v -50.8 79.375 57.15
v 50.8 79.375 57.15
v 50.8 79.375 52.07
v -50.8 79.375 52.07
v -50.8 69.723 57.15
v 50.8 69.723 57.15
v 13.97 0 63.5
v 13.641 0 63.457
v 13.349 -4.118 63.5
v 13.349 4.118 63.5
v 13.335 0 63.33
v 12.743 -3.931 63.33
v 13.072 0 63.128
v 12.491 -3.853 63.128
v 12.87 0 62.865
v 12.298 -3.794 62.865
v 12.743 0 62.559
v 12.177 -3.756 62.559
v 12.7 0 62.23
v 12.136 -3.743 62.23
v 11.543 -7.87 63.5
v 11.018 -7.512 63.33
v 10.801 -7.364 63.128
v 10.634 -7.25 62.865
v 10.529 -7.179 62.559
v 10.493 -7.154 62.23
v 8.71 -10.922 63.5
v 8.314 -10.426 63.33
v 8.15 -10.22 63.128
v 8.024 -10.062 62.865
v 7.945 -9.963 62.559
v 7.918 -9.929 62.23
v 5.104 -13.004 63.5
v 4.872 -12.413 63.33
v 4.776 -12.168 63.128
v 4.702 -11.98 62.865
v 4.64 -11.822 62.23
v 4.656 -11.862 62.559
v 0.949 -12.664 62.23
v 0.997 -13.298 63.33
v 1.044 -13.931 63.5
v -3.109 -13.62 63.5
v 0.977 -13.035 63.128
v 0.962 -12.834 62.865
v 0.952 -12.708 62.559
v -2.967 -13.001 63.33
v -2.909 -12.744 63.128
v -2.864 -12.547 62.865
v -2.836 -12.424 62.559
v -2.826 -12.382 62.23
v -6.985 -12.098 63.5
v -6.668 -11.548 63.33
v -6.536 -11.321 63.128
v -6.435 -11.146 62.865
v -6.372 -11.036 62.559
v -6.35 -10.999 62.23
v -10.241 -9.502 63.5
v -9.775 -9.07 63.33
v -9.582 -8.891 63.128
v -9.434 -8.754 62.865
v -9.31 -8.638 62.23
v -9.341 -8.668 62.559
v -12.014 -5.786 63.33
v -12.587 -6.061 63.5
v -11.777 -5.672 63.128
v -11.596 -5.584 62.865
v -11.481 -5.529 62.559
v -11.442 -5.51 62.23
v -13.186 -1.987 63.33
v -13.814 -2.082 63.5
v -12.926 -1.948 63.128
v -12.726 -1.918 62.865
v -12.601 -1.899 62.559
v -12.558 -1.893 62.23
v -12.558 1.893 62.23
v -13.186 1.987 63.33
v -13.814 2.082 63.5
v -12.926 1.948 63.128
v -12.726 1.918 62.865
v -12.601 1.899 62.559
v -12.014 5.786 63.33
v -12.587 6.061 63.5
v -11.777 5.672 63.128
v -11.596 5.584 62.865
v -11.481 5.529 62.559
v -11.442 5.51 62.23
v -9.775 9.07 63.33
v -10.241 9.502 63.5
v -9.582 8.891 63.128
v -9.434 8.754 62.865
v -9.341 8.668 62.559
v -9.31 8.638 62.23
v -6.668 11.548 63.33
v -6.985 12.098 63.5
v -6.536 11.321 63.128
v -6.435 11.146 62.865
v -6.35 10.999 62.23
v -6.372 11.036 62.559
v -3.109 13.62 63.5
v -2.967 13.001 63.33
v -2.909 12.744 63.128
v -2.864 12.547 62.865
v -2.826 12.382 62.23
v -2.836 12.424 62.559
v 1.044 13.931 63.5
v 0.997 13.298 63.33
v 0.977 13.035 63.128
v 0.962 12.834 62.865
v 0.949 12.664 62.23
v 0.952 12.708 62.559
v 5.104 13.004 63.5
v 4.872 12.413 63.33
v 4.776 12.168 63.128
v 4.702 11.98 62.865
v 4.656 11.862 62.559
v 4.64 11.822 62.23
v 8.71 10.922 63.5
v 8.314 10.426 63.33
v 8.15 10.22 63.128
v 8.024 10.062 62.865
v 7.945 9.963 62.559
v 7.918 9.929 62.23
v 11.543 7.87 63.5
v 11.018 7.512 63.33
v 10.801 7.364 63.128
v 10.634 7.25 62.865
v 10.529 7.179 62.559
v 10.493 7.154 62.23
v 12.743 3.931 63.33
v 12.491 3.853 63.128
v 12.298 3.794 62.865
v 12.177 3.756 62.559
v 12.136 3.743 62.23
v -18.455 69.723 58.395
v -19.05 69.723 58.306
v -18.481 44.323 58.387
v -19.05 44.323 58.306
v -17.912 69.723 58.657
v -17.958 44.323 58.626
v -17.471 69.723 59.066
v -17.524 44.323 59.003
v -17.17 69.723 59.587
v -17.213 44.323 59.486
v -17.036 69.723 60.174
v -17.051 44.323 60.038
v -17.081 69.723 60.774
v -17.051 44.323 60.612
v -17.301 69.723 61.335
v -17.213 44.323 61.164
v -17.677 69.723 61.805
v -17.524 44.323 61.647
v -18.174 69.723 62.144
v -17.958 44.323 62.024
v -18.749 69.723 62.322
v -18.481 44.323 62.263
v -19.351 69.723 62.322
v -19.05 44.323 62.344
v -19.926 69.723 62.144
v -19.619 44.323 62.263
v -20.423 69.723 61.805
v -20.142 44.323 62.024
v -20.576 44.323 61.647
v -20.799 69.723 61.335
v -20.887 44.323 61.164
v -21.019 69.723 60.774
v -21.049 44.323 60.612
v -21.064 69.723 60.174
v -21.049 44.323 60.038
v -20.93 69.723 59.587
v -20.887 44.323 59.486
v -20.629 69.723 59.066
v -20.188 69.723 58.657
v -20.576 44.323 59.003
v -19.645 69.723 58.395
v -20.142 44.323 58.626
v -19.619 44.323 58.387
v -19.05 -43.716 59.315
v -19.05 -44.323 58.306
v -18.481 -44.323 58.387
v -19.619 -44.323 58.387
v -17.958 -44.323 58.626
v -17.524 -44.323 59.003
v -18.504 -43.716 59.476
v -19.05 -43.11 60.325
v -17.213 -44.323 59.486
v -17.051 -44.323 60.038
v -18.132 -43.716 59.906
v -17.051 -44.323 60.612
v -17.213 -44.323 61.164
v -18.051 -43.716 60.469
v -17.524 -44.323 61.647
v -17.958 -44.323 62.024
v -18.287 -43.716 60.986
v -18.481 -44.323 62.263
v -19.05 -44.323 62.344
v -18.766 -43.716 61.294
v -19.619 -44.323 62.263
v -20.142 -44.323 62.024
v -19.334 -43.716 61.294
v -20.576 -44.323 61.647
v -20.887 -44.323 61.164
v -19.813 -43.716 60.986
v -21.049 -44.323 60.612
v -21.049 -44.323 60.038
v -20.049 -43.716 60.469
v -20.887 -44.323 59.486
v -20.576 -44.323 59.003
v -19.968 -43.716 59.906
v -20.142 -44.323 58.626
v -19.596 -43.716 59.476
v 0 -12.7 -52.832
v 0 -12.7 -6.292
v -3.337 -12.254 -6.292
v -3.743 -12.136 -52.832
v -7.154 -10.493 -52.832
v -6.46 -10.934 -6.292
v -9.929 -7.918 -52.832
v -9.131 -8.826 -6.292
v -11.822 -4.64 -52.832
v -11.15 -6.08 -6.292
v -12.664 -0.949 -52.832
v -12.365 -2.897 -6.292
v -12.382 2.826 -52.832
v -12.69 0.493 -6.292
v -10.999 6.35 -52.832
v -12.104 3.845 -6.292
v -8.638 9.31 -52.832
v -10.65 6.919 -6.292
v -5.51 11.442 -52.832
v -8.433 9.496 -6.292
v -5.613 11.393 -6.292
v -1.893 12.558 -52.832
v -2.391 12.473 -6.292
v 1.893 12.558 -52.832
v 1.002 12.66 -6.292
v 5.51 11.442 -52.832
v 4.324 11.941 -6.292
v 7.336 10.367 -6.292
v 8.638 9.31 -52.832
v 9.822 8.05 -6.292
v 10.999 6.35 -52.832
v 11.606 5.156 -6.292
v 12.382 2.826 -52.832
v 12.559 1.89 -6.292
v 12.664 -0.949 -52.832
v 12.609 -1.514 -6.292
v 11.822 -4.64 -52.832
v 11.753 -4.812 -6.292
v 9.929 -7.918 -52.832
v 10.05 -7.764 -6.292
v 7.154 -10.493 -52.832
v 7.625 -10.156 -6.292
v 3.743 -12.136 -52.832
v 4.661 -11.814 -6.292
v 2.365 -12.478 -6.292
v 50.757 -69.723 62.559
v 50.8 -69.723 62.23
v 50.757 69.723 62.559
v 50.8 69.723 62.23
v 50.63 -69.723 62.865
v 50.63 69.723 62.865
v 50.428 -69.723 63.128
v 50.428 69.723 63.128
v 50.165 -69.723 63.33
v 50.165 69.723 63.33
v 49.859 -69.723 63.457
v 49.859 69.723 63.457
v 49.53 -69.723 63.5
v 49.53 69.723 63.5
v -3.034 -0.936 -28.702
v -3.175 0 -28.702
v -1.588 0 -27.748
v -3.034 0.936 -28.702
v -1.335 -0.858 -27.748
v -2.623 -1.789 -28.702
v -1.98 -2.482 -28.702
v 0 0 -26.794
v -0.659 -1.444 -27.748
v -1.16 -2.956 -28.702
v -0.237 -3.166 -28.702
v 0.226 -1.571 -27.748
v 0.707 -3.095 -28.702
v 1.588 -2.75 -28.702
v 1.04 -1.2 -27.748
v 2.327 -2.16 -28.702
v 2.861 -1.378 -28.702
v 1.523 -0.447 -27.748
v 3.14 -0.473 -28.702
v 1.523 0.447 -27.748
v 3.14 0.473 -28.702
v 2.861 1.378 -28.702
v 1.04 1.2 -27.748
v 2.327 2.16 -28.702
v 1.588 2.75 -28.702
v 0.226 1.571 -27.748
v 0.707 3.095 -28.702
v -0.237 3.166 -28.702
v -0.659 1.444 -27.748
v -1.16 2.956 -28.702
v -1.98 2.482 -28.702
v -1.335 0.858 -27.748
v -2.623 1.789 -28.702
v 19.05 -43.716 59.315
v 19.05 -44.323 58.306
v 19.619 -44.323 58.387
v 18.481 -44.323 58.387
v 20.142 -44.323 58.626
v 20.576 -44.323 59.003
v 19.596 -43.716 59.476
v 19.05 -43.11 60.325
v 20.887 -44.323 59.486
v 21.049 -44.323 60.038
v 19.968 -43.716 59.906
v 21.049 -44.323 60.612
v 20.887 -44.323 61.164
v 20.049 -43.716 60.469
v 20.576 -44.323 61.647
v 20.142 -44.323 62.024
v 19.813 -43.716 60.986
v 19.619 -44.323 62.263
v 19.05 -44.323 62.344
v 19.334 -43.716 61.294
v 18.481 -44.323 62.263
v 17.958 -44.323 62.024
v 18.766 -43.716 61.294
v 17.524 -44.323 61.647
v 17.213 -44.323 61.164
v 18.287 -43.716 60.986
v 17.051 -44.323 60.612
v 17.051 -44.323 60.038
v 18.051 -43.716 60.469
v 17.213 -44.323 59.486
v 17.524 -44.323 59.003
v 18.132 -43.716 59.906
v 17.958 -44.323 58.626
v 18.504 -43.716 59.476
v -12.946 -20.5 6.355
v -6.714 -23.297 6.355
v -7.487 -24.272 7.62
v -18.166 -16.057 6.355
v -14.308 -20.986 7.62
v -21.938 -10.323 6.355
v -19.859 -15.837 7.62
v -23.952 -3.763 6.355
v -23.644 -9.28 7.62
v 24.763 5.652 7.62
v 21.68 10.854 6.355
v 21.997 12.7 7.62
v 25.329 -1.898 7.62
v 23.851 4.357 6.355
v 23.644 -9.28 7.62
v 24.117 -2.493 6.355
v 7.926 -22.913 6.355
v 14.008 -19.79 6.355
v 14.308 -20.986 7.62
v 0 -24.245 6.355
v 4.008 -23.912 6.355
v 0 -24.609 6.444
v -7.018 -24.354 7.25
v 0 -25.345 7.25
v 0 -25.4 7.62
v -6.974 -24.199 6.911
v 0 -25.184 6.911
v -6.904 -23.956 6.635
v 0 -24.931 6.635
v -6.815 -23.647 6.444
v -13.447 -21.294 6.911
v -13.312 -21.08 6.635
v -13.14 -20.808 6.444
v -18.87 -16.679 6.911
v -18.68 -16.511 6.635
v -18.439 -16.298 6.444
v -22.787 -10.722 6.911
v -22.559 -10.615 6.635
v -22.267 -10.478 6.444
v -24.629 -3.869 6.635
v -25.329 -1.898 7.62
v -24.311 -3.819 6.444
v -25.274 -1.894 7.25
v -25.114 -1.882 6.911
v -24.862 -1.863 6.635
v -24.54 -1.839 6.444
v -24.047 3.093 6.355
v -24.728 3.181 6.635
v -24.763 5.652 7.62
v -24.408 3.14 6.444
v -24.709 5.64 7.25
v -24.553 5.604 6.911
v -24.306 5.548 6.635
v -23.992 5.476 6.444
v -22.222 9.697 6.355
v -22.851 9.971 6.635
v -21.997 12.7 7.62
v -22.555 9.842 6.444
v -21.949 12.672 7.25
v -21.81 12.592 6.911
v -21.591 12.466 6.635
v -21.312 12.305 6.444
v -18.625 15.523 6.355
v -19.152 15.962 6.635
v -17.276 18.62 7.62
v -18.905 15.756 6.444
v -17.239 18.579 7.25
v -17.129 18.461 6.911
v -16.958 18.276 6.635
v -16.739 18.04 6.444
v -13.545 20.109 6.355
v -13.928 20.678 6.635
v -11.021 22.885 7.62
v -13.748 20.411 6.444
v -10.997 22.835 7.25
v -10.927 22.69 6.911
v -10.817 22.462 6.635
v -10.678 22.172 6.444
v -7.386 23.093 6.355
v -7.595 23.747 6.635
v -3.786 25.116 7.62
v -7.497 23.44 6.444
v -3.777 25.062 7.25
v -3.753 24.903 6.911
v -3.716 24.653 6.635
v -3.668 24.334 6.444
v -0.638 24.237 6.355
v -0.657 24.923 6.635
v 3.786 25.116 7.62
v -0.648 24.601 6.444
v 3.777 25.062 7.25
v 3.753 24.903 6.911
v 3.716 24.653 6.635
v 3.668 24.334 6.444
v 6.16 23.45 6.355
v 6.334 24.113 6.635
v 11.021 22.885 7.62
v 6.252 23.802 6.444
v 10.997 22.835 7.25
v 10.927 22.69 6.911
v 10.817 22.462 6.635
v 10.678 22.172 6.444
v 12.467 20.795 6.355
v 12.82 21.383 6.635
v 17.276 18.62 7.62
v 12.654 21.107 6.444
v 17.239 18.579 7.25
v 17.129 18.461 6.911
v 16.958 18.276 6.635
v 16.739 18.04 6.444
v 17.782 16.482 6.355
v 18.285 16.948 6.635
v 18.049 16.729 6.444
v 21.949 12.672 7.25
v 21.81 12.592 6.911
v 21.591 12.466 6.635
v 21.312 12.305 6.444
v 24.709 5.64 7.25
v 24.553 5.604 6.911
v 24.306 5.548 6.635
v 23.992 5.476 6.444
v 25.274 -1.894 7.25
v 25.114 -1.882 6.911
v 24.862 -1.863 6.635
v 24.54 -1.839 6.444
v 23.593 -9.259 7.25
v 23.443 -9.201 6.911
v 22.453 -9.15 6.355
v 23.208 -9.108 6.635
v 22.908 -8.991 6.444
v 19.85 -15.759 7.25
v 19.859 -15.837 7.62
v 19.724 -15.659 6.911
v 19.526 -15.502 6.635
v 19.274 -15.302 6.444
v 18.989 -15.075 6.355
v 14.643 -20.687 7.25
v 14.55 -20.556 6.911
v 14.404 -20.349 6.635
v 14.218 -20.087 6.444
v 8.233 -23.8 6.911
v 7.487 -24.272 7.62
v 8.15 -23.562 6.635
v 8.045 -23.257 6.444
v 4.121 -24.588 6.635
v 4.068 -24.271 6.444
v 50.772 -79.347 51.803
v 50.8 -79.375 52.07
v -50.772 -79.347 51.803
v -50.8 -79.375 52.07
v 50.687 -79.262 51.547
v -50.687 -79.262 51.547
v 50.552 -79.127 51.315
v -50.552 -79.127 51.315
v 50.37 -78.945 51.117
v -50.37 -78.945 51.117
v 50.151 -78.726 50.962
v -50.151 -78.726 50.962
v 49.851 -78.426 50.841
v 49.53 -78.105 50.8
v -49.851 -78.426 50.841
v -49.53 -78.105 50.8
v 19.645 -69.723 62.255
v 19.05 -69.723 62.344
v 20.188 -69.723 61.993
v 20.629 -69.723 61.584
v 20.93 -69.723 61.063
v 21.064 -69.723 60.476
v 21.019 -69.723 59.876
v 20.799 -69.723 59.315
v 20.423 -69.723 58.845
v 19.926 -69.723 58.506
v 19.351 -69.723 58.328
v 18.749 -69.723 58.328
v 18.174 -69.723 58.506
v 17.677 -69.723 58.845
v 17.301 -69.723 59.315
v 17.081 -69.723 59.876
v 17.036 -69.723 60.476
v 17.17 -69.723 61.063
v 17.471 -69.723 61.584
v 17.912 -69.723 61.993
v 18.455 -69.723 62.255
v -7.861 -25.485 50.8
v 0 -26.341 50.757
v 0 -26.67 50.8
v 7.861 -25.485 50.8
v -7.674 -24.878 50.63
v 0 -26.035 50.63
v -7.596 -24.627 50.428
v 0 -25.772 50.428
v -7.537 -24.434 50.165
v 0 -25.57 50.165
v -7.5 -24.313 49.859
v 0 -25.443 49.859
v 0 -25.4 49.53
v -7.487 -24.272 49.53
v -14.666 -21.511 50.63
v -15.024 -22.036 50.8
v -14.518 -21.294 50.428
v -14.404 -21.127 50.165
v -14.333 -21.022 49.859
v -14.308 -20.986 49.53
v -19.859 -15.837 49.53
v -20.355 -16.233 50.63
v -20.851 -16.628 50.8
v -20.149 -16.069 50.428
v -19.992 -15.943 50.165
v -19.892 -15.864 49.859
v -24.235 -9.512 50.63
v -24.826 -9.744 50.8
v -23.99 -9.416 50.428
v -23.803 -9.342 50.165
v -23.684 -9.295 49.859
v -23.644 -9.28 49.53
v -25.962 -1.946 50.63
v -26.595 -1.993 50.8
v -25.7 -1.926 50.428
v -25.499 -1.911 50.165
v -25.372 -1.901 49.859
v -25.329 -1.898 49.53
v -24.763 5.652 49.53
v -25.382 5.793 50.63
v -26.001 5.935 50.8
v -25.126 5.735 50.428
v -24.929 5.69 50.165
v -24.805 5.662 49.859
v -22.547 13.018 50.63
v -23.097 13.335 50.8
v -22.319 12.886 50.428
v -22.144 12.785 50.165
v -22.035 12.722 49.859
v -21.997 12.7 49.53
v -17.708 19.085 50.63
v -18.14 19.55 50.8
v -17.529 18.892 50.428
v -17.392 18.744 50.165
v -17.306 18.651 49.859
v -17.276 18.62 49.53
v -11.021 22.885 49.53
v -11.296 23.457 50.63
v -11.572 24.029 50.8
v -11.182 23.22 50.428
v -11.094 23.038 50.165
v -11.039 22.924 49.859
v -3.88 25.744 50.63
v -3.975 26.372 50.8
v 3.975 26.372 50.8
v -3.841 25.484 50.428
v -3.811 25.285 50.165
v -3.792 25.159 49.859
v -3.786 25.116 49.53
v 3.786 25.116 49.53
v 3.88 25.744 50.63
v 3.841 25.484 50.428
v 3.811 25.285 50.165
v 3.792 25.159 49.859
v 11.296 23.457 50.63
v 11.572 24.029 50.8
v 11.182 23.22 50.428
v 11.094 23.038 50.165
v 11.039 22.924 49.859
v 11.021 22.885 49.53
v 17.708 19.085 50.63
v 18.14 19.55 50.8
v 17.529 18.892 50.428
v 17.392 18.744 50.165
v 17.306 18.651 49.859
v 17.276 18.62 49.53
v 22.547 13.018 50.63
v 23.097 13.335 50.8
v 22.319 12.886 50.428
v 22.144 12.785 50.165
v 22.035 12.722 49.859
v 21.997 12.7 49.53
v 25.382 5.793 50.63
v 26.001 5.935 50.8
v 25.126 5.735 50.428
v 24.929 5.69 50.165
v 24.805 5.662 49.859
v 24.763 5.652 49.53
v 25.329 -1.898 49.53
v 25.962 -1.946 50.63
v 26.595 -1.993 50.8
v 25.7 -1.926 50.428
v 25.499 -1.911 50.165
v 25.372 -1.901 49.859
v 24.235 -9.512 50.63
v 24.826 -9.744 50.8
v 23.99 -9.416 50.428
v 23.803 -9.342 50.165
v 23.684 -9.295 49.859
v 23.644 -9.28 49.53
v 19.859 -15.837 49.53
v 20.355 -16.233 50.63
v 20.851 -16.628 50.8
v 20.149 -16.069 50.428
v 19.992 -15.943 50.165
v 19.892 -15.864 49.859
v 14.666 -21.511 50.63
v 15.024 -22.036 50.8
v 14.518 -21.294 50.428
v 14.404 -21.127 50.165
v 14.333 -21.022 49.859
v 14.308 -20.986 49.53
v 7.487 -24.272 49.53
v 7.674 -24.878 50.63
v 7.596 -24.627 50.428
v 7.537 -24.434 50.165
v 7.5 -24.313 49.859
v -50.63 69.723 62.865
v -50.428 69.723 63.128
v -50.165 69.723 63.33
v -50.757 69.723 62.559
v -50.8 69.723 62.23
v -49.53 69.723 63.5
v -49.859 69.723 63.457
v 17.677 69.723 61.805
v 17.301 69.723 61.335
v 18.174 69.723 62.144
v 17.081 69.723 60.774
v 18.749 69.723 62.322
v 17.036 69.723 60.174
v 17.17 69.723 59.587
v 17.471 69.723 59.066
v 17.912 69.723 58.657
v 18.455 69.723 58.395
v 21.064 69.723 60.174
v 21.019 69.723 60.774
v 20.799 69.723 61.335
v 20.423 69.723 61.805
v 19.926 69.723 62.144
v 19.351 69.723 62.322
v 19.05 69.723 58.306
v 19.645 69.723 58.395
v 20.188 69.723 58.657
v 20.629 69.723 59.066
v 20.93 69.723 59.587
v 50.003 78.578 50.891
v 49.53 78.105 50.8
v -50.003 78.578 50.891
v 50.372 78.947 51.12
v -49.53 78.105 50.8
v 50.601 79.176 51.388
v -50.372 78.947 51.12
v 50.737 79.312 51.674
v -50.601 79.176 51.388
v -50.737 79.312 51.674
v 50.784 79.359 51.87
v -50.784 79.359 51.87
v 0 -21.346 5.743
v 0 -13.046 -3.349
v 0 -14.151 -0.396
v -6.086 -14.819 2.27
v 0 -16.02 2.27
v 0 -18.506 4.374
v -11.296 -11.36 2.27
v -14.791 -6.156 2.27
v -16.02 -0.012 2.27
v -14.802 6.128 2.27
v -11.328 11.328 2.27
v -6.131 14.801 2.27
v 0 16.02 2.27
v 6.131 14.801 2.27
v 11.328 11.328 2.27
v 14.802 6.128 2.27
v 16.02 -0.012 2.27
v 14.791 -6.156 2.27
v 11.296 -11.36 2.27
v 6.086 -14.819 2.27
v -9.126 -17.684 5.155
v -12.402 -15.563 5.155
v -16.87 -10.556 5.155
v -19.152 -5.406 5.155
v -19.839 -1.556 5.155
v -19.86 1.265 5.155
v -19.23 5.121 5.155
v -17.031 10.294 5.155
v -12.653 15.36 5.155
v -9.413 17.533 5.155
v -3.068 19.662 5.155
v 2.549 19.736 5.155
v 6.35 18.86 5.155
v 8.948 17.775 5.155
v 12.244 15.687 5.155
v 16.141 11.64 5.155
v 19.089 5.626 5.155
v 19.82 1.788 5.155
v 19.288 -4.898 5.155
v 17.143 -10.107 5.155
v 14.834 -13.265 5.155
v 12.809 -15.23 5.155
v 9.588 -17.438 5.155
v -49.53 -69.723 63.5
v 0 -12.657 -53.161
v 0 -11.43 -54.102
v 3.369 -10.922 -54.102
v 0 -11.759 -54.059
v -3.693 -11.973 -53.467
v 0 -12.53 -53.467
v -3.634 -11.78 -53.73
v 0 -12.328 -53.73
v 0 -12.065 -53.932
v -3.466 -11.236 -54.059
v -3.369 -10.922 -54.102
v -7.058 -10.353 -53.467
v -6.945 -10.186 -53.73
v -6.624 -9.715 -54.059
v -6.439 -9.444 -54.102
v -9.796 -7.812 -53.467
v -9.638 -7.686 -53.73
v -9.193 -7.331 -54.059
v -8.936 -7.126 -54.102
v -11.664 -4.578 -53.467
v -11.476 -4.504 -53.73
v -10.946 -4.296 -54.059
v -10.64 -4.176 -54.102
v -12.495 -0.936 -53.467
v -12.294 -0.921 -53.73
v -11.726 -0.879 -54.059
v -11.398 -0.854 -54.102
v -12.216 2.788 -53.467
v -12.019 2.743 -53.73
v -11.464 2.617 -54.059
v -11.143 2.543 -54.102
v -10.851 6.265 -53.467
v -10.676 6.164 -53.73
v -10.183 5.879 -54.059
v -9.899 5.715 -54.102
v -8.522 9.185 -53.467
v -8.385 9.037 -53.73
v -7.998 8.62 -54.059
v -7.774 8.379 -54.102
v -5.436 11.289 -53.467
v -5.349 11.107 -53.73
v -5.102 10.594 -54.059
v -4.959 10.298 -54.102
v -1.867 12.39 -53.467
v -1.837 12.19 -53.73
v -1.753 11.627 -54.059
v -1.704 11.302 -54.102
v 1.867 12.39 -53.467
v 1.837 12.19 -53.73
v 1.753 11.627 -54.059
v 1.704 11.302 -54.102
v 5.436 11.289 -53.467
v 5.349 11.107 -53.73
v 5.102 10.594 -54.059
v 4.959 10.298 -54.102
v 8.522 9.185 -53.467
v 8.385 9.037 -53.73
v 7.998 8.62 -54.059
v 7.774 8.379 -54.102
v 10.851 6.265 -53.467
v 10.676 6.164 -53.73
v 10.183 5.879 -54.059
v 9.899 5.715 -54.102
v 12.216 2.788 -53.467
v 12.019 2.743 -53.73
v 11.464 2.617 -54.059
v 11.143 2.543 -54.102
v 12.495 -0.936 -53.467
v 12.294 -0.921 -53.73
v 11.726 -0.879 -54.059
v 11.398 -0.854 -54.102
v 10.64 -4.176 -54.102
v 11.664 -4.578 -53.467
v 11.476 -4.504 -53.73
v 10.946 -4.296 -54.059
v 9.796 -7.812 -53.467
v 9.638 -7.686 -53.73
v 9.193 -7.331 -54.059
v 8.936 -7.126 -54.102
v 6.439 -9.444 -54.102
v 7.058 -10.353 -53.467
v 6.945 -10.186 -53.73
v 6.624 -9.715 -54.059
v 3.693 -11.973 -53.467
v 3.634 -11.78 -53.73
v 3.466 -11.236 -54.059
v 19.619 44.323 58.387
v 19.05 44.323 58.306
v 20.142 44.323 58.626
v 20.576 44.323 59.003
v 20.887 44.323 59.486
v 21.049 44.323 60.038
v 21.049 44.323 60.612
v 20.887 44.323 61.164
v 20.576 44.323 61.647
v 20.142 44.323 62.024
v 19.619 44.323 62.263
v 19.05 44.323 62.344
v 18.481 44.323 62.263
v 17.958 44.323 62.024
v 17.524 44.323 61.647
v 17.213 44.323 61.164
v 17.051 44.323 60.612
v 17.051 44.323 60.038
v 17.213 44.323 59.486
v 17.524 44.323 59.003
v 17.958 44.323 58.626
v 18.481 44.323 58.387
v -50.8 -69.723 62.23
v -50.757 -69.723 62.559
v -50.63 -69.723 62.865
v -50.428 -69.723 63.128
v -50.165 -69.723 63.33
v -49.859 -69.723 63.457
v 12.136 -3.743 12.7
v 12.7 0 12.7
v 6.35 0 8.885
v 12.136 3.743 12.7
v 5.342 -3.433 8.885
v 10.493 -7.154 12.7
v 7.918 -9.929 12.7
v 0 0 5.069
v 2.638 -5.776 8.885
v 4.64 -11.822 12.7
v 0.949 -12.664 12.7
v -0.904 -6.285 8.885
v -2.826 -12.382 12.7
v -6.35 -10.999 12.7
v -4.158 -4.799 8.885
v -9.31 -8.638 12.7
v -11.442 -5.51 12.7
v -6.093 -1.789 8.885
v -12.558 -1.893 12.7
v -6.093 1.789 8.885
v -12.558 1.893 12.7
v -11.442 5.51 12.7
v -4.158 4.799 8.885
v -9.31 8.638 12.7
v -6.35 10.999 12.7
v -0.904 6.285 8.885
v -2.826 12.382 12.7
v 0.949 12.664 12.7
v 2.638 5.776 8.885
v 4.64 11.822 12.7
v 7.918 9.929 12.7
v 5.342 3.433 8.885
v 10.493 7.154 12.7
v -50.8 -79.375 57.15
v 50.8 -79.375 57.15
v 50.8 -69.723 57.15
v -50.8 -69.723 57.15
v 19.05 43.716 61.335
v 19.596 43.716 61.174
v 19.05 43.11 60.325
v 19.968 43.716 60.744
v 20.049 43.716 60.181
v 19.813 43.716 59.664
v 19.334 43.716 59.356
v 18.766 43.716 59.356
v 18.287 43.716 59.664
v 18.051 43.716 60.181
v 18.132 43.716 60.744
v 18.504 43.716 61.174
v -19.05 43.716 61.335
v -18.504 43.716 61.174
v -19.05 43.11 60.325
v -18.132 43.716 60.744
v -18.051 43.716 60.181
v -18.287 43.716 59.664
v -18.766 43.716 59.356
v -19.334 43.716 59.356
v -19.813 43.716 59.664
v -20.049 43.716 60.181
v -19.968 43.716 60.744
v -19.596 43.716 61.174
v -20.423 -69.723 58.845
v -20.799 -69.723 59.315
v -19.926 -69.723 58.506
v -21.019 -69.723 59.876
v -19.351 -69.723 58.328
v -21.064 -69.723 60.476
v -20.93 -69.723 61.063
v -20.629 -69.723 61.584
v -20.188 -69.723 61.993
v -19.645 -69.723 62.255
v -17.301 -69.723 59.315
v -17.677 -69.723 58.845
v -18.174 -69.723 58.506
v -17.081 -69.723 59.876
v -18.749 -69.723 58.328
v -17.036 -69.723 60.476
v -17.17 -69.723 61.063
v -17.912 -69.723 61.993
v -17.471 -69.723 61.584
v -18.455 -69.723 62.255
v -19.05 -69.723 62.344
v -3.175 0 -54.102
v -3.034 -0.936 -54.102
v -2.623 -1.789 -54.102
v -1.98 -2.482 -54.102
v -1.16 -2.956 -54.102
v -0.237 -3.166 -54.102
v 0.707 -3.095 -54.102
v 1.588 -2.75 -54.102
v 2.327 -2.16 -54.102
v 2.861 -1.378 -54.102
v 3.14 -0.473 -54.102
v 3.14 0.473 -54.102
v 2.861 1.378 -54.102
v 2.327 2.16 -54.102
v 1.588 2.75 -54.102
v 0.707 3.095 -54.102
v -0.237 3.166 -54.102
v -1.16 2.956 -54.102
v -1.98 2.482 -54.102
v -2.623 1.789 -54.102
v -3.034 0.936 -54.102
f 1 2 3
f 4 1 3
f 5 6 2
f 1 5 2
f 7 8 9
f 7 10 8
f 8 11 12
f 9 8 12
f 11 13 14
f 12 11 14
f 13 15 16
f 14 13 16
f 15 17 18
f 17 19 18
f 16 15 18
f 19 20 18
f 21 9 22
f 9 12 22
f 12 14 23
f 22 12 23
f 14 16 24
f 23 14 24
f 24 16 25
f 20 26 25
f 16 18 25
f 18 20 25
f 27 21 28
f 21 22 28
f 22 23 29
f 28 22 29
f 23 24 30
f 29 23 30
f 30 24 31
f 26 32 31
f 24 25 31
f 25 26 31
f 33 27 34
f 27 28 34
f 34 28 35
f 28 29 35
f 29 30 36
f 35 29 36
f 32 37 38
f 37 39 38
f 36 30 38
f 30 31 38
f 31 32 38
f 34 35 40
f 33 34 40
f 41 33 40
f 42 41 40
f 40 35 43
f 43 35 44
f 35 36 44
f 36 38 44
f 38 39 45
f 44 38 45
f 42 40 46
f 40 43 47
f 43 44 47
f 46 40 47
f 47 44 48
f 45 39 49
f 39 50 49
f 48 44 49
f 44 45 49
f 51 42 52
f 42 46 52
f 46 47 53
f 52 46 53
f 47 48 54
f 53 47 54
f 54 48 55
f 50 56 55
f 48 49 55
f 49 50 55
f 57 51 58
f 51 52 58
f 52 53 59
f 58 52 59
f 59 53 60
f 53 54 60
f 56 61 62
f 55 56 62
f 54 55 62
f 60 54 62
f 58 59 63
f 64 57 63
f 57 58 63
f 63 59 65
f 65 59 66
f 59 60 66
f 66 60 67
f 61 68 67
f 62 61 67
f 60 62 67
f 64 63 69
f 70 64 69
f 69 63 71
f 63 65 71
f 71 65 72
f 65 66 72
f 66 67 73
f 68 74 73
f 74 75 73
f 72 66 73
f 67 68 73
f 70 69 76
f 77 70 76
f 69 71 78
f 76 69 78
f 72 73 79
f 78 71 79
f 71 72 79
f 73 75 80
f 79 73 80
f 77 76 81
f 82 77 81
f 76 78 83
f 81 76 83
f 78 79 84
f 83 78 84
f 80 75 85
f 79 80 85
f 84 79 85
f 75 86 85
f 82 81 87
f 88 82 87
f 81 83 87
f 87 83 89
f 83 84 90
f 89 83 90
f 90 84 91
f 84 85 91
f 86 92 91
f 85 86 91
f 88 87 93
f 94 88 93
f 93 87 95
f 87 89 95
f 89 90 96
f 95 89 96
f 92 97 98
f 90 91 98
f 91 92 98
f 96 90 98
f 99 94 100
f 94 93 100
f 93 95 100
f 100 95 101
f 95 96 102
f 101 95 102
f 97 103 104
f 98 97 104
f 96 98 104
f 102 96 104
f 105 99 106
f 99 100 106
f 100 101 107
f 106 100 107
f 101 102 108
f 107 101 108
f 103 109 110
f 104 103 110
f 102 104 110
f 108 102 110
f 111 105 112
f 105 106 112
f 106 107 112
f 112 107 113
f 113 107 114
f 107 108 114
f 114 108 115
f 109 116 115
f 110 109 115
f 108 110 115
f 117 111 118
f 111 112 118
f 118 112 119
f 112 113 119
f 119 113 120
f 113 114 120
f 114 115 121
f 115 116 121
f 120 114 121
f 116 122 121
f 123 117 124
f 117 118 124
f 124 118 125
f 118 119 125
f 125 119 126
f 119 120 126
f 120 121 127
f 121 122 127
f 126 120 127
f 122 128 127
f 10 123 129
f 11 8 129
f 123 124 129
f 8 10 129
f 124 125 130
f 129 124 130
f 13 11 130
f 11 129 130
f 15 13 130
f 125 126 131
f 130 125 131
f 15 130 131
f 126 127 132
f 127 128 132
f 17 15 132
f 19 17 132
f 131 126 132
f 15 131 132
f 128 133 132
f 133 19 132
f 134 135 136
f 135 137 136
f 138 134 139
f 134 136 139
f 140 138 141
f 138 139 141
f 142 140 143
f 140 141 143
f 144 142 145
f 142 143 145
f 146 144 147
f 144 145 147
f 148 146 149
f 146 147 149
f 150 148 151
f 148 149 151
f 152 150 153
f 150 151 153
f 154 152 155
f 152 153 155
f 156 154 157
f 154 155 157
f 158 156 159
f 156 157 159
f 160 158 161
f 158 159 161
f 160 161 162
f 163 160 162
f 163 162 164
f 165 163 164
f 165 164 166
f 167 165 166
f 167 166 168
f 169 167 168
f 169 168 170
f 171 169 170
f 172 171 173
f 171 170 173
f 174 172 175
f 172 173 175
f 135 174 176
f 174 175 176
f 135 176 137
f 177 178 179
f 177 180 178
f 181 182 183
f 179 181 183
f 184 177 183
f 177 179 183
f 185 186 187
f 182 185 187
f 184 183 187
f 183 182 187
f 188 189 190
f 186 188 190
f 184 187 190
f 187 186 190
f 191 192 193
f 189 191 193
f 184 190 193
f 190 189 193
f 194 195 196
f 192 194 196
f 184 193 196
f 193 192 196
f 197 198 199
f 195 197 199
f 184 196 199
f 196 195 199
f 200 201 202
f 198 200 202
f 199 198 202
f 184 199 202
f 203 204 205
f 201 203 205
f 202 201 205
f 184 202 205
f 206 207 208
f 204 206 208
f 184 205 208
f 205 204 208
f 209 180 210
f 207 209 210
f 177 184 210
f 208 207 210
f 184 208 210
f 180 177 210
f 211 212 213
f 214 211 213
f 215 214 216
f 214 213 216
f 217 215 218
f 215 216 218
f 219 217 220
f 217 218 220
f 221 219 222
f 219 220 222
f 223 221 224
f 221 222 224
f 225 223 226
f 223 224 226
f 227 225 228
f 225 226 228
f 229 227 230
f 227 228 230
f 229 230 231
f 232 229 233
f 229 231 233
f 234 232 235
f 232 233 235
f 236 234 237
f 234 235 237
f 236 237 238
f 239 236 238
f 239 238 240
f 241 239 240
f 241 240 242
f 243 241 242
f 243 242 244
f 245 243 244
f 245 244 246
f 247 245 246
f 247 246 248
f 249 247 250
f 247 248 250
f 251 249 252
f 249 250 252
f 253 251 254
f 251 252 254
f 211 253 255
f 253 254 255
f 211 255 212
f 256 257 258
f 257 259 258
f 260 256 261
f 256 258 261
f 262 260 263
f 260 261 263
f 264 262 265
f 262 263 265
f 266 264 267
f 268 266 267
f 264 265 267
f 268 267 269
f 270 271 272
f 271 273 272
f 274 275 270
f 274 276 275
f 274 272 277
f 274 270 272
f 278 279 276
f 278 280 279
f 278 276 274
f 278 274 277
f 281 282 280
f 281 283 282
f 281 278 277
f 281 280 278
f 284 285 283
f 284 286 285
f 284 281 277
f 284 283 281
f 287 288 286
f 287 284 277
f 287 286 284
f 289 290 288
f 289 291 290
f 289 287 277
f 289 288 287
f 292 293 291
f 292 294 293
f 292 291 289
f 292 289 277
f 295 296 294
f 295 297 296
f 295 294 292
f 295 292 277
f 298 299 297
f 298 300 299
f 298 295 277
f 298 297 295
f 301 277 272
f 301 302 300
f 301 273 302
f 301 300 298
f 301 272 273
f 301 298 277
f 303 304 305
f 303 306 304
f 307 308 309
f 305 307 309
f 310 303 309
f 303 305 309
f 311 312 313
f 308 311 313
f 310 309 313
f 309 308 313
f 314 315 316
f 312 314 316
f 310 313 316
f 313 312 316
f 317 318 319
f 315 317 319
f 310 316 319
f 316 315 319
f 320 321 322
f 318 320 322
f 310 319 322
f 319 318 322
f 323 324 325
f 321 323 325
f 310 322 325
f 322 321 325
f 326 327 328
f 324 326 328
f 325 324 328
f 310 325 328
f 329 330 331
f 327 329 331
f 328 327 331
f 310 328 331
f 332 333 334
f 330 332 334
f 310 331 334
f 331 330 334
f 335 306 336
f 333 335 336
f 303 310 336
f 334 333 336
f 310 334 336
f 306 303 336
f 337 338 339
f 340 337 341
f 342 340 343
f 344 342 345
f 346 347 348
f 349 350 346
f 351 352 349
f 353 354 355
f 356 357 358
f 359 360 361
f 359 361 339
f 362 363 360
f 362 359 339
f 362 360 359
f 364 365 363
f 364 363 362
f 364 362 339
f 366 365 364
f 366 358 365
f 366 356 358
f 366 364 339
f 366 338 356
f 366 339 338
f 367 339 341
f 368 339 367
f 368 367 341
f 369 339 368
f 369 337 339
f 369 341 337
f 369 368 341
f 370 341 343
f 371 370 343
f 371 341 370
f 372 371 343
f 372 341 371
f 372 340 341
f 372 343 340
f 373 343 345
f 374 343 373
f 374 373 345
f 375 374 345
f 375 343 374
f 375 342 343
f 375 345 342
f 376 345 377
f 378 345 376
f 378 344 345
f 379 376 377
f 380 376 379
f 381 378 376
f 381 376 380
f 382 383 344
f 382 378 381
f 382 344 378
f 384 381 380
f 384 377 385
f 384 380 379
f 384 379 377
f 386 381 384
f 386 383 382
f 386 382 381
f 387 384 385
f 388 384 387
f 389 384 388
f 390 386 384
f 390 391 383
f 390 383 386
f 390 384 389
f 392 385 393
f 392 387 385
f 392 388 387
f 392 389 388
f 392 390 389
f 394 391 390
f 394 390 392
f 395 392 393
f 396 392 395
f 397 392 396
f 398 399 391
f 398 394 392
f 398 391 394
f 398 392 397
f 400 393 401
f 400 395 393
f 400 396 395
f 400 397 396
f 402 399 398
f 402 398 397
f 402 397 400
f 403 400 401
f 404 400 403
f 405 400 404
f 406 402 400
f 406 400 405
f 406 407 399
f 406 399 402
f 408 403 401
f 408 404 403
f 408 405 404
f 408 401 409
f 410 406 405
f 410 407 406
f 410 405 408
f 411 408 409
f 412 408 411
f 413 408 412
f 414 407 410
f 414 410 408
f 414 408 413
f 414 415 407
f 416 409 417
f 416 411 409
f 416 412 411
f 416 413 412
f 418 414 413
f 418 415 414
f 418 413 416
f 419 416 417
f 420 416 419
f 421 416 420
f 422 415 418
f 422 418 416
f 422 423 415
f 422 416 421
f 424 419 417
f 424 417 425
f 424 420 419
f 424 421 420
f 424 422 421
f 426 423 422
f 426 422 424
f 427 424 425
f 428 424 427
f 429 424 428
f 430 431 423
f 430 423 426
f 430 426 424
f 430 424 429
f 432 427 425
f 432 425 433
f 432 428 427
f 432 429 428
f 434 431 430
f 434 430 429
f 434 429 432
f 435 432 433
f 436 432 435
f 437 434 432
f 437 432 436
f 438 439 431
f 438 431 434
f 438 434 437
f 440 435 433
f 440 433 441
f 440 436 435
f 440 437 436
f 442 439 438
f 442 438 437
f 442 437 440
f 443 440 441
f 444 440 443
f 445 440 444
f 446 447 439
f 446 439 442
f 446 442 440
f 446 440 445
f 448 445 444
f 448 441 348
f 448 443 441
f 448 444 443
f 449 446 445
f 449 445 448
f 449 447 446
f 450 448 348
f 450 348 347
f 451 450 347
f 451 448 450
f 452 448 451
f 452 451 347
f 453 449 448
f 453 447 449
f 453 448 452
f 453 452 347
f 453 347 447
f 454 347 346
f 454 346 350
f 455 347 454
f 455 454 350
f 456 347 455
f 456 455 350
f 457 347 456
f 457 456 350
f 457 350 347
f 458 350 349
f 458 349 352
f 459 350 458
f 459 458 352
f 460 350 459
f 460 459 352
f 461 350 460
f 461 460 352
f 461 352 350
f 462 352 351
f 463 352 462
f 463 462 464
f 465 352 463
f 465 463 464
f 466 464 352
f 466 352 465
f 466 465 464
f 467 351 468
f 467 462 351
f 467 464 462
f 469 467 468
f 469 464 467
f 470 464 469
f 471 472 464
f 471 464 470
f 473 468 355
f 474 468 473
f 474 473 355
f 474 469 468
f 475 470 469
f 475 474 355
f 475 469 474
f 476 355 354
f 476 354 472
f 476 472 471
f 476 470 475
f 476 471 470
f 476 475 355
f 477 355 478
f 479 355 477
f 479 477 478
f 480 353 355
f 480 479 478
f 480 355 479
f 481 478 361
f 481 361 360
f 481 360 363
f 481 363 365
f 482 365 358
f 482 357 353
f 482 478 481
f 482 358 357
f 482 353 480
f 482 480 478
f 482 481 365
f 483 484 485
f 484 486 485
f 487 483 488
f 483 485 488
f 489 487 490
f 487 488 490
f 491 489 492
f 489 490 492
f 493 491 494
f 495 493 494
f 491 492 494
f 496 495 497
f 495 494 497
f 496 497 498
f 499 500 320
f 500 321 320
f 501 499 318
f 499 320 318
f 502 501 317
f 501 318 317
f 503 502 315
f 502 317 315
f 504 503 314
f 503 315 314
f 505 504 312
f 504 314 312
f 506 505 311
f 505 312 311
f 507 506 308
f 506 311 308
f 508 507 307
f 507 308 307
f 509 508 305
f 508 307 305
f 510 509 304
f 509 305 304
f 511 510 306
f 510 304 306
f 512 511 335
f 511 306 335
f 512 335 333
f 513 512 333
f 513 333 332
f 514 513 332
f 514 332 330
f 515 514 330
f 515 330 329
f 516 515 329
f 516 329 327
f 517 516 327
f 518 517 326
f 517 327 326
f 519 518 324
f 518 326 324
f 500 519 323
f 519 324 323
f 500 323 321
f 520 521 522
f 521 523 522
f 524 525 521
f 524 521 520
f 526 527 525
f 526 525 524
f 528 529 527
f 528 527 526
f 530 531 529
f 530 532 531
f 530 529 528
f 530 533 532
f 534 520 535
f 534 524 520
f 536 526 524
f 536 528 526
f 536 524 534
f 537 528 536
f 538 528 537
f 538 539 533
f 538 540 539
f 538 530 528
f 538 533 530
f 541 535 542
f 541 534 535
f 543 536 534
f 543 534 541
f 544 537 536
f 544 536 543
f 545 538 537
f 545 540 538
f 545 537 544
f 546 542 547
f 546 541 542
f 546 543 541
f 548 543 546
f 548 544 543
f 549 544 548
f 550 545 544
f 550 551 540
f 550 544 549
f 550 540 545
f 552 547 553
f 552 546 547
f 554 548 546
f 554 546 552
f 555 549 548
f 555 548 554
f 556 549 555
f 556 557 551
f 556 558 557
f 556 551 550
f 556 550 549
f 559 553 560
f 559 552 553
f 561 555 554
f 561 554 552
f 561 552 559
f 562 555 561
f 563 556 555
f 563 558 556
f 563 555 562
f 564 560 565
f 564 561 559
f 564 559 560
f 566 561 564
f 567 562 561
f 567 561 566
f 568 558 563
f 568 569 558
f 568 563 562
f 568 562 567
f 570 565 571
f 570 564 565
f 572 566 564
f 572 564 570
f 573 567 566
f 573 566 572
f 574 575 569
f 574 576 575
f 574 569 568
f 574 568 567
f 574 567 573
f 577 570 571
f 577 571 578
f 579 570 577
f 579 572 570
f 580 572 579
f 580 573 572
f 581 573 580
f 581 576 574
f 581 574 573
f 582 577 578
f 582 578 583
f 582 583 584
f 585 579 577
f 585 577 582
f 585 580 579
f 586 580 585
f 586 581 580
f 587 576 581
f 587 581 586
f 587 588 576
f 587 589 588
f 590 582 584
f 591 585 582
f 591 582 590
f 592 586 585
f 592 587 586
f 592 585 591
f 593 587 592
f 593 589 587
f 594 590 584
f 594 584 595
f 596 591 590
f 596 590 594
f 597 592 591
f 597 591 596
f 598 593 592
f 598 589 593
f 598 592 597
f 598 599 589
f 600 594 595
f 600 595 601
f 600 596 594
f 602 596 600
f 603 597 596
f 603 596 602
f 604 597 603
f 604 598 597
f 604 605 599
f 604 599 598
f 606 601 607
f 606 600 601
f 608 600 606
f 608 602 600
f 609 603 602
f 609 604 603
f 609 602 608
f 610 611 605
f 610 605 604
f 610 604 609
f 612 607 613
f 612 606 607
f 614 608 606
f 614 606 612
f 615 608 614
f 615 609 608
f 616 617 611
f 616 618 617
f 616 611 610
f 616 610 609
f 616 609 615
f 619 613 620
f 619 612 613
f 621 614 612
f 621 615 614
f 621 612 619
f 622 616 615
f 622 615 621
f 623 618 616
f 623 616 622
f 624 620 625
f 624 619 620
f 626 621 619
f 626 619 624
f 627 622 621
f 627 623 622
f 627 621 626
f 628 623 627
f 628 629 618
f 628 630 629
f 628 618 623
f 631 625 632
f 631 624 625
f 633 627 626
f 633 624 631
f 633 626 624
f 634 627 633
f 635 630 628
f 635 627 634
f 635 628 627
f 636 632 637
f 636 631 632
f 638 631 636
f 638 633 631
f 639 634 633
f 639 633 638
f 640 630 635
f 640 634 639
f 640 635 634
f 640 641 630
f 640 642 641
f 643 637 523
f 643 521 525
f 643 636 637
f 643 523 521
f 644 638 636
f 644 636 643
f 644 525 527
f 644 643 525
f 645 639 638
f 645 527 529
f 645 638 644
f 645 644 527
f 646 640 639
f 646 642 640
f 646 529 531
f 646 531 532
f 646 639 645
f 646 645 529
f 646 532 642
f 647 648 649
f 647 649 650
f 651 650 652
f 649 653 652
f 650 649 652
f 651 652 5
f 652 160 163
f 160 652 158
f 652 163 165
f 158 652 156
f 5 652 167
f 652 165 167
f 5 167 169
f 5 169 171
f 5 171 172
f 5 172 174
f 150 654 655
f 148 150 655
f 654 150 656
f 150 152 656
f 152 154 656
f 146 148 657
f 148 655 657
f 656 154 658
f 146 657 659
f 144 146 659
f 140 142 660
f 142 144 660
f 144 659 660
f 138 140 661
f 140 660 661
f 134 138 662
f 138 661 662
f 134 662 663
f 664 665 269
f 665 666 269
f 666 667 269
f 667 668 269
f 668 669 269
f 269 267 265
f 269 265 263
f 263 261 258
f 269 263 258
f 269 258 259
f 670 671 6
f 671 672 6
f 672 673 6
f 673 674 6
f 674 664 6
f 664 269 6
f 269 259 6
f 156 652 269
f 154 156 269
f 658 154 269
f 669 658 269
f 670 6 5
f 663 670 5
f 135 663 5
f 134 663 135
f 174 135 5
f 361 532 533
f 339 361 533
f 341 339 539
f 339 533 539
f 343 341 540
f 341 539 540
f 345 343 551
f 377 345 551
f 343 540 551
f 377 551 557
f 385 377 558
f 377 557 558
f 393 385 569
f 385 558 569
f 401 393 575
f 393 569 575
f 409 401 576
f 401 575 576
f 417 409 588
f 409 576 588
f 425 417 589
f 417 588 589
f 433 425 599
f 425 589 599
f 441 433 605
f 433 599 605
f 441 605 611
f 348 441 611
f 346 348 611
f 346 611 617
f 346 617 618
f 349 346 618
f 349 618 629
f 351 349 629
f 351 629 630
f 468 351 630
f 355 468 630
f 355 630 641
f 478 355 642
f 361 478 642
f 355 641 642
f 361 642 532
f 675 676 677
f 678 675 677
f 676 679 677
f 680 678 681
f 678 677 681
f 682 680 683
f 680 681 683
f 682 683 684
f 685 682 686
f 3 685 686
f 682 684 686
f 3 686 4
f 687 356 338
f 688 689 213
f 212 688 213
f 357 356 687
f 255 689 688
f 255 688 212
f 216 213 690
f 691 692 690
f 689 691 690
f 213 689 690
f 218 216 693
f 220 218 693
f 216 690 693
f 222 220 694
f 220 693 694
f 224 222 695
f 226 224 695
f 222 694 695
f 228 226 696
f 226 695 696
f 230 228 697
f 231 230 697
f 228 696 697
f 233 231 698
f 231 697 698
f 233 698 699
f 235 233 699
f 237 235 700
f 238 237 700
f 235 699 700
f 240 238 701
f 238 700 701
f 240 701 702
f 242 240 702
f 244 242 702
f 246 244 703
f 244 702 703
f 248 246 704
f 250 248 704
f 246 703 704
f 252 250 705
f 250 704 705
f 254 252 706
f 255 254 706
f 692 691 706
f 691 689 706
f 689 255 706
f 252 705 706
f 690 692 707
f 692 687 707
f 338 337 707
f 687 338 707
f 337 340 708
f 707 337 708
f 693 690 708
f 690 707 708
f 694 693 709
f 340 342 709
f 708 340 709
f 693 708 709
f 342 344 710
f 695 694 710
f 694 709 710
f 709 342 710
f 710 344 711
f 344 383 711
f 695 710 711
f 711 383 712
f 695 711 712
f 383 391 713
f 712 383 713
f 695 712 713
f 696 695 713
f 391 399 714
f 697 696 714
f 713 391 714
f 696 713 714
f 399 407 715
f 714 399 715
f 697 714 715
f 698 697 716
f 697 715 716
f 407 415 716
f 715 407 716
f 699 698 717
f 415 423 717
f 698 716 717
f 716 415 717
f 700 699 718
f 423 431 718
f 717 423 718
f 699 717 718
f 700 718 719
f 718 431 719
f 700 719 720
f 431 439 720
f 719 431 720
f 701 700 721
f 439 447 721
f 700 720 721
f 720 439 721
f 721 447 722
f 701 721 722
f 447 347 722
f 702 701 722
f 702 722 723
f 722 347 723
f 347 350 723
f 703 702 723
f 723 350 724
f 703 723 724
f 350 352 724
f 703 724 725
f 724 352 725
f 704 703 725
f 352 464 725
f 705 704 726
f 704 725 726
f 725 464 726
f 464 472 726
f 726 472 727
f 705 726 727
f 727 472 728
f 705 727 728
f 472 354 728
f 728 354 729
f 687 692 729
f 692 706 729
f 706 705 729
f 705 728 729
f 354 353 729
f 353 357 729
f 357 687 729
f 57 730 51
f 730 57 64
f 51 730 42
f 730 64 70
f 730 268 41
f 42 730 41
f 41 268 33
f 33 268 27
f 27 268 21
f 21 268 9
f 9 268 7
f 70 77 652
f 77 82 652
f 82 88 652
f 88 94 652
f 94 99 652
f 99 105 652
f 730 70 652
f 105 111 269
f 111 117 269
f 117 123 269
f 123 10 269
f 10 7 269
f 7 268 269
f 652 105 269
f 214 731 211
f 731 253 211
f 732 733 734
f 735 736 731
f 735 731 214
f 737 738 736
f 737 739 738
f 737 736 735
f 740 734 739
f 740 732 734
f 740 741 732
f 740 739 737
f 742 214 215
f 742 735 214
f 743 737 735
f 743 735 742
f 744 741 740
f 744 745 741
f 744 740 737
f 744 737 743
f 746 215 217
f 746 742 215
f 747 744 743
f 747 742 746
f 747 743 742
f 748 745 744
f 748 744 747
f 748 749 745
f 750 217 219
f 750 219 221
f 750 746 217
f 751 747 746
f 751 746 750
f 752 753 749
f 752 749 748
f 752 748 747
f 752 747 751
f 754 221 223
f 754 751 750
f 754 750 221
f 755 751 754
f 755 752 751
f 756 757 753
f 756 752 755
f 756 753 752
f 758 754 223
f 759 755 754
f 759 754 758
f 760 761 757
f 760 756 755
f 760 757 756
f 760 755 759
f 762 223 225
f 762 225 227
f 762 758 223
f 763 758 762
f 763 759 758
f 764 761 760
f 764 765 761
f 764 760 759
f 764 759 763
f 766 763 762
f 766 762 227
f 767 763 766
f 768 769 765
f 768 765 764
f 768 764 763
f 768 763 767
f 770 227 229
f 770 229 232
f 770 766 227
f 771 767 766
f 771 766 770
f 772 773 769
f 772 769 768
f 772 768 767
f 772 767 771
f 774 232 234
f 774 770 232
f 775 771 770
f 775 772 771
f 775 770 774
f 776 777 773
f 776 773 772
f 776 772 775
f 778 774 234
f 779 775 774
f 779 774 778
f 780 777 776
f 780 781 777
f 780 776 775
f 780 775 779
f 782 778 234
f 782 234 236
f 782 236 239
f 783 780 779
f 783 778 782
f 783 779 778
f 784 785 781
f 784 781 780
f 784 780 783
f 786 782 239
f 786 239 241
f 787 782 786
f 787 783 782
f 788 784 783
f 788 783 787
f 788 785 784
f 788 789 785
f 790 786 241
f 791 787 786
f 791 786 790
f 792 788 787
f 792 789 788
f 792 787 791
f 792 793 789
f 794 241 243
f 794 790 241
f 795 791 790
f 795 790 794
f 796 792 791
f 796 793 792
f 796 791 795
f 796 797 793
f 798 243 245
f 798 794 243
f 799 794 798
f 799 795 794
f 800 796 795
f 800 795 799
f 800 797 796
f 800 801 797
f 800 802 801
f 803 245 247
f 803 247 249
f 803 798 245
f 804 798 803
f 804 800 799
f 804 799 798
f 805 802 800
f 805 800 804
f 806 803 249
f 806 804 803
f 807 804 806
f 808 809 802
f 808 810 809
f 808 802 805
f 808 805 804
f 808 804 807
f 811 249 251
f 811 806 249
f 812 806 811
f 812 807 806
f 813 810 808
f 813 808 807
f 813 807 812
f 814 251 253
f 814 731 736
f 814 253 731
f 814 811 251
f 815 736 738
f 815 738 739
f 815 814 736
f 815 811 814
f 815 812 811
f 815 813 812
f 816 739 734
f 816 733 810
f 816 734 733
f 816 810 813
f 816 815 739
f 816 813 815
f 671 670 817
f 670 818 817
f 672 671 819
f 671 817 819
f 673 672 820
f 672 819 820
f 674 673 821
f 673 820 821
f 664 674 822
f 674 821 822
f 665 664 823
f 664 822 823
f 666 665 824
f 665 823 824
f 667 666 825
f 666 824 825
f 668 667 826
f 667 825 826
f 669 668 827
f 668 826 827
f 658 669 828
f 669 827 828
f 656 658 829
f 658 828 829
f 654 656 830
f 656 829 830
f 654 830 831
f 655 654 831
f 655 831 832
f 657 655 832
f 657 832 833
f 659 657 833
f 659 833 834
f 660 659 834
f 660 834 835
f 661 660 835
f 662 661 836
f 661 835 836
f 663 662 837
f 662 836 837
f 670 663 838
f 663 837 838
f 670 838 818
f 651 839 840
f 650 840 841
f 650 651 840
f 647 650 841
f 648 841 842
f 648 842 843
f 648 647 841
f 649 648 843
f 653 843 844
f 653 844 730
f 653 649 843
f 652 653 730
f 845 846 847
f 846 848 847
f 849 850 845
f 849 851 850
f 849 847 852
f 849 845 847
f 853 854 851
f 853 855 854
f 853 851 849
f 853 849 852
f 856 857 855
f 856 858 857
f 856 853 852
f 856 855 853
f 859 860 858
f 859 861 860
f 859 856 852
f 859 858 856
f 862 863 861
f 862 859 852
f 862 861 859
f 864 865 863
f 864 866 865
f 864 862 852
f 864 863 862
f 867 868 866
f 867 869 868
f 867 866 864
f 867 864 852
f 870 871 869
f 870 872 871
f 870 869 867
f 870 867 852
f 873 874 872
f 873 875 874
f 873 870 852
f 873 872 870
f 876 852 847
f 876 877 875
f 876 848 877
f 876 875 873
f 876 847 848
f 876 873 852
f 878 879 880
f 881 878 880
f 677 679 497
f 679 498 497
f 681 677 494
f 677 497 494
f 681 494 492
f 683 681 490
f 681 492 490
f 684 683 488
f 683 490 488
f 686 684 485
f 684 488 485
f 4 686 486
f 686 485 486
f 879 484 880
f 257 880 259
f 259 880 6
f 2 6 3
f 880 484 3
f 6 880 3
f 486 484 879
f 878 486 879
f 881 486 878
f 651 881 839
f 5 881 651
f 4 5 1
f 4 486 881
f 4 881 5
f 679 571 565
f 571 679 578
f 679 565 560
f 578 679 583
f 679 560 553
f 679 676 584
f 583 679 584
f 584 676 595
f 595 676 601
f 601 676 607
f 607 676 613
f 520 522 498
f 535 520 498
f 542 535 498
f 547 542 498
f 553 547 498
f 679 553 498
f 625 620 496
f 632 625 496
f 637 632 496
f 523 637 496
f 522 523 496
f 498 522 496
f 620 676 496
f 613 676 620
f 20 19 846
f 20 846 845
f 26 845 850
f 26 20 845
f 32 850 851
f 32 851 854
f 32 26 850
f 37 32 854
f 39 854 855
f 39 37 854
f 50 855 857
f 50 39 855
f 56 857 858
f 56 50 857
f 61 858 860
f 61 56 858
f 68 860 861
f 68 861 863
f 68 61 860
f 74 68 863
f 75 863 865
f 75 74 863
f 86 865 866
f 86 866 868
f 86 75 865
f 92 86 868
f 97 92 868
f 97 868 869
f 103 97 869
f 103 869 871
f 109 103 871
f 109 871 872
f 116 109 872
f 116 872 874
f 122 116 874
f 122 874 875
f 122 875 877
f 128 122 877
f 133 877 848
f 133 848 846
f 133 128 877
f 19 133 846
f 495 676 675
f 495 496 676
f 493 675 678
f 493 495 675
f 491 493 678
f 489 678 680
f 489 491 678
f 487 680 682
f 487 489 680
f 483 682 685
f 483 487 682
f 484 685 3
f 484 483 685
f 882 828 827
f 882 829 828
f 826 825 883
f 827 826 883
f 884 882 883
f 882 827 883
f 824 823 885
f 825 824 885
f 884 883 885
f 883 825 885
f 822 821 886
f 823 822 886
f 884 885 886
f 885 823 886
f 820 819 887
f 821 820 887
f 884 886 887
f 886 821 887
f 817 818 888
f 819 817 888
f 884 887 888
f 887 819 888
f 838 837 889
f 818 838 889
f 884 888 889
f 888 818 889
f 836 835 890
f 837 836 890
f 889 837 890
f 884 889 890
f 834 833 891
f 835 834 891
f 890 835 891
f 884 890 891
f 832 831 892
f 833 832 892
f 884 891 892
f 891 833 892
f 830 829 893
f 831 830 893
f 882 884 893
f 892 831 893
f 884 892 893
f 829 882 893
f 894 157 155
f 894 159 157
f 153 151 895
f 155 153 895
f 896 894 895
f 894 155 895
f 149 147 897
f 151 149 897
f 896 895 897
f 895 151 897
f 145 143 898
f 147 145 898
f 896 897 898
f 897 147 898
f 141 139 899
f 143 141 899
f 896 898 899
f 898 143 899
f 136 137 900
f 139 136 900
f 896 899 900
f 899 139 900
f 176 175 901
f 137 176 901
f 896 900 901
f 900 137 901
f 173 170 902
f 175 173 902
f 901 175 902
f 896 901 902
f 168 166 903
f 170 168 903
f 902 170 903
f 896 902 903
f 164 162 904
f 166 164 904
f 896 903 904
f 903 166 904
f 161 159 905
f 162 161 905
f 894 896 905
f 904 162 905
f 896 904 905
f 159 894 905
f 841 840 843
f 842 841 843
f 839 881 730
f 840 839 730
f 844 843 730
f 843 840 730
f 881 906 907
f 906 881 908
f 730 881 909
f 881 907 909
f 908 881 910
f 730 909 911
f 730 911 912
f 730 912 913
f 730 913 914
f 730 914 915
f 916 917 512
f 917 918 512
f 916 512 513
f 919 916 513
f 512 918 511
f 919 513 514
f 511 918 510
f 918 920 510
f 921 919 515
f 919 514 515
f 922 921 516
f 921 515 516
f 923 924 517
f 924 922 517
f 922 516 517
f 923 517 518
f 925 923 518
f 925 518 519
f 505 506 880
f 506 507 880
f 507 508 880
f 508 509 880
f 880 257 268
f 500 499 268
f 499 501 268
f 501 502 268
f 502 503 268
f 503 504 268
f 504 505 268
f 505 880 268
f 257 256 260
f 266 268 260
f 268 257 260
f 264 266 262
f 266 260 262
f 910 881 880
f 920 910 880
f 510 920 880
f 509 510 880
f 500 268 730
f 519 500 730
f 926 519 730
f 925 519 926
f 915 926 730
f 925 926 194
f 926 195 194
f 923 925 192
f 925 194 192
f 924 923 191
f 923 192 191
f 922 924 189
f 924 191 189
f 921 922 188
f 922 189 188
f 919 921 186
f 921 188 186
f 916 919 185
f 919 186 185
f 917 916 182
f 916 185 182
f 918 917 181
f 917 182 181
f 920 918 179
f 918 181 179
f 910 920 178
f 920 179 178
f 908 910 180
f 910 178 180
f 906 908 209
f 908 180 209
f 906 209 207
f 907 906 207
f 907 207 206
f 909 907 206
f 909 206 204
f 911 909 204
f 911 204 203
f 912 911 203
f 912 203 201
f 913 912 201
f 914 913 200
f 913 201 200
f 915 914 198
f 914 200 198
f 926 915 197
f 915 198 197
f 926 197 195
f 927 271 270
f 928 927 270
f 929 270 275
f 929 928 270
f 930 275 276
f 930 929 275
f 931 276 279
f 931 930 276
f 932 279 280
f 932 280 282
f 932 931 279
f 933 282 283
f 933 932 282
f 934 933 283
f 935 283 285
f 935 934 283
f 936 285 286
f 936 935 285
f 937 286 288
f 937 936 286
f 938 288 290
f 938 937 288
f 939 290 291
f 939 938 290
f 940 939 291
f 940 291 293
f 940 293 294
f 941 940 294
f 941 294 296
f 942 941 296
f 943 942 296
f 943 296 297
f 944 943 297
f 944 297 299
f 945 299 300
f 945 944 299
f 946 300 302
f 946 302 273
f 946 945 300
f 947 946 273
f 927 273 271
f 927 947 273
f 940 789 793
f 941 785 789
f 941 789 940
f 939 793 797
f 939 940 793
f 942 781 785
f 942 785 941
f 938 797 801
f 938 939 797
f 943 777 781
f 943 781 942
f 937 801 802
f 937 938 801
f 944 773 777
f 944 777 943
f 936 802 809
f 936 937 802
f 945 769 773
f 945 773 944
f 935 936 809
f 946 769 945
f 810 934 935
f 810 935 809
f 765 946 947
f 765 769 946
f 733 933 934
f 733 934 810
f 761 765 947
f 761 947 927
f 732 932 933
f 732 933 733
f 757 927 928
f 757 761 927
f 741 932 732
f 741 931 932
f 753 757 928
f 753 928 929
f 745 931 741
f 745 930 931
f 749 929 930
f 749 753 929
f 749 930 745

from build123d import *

# Parameters (mm, degrees)
BOSS_EXTRUDE1_DEPTH                  = 50.8
BOSS_EXTRUDE1_DEPTH_BACK             = 50.8
F_10_32_TAPPED_HOLE1_D               = 4.0386
F_10_32_TAPPED_HOLE1_DEPTH           = 25.4
F_10_32_TAPPED_HOLE1_TIP             = 1.213317848
F_10_32_TAPPED_HOLE1_ON_FACE_2_D     = 4.0386
F_10_32_TAPPED_HOLE1_ON_FACE_2_DEPTH = 25.4
F_10_32_TAPPED_HOLE1_ON_FACE_2_TIP   = 1.213317848
SKETCH3_R                            = 25.4
BOSS_EXTRUDE2_DEPTH                  = 44.45
SKETCH4_R                            = 12.7
BOSS_EXTRUDE3_DEPTH                  = 60.452
FILLET1_R                            = 1.27
FILLET2_R                            = 12.7
BODY_MOVE_COPY1_ANGLE                = 90


with BuildPart() as part:
    # Sketch1 → Boss-Extrude1 (new, two sides: drawn at the far end of the back side and taken through both)
    with BuildSketch(Plane(origin=(0, 0, 0), x_dir=(1, 0, 0), z_dir=(0, 1, 0)).offset(-BOSS_EXTRUDE1_DEPTH_BACK)):
        Polygon((0, -50.8), (-79.375, -50.8), (-79.375, -57.15), (-69.723, -57.15), (-69.723, -63.5), (69.723, -63.5), (69.723, -57.15), (79.375, -57.15), (79.375, -50.8), align=None)
    extrude(amount=BOSS_EXTRUDE1_DEPTH + BOSS_EXTRUDE1_DEPTH_BACK)

    # #10-32 Tapped Hole1
    with Locations(Plane(origin=(-69.723, 19.05, 60.325), x_dir=(0, 0, -1), z_dir=(-1, 0, 0))):
        with Locations((0, 0), (0, 38.1)):
            Hole(F_10_32_TAPPED_HOLE1_D / 2, depth=F_10_32_TAPPED_HOLE1_DEPTH)
            with Locations((0, 0, -(F_10_32_TAPPED_HOLE1_DEPTH + F_10_32_TAPPED_HOLE1_TIP / 2))):  # 118° drill point
                Cone(0, F_10_32_TAPPED_HOLE1_D / 2, F_10_32_TAPPED_HOLE1_TIP, mode=Mode.SUBTRACT)

    # #10-32 Tapped Hole1 on face 2
    with Locations(Plane(origin=(69.723, 19.05, 60.325), x_dir=(0, 0, 1), z_dir=(1, 0, 0))):
        with Locations((0, 0), (0, 38.1)):
            Hole(F_10_32_TAPPED_HOLE1_ON_FACE_2_D / 2, depth=F_10_32_TAPPED_HOLE1_ON_FACE_2_DEPTH)
            with Locations((0, 0, -(F_10_32_TAPPED_HOLE1_ON_FACE_2_DEPTH + F_10_32_TAPPED_HOLE1_ON_FACE_2_TIP / 2))):  # 118° drill point
                Cone(0, F_10_32_TAPPED_HOLE1_ON_FACE_2_D / 2, F_10_32_TAPPED_HOLE1_ON_FACE_2_TIP, mode=Mode.SUBTRACT)

    # Sketch3 → Boss-Extrude2 (add)
    with BuildSketch(Plane(origin=(0, 0, 50.8), x_dir=(-1, 0, 0), z_dir=(0, 0, -1))):
        Circle(SKETCH3_R)
    extrude(amount=BOSS_EXTRUDE2_DEPTH)

    # Sketch4 → Boss-Extrude3 (add)
    with BuildSketch(Plane(origin=(0, 0, 6.35), x_dir=(-1, 0, 0), z_dir=(0, 0, -1))):
        Circle(SKETCH4_R)
    extrude(amount=BOSS_EXTRUDE3_DEPTH)

    # Sketch5 → 1/4 (0.25) Diameter Hole1 (revolve, cut)
    with BuildSketch(Plane(origin=(0, 0, -54.102), x_dir=(0, 1, 0), z_dir=(1, 0, 0))):
        Polygon((0, 0), (0, 27.307732465), (3.175, 25.4), (3.175, 0), align=None)
    revolve(axis=Axis((0, 0, -60.452), (0, 0, 1)), mode=Mode.SUBTRACT)

    # Sketch6 → 1 (1) Diameter Hole1 (revolve, cut)
    with BuildSketch(Plane(origin=(0, 0, 63.5), x_dir=(0, -1, 0), z_dir=(1, 0, 0))):
        Polygon((0, 0), (0, 58.430929862), (12.7, 50.8), (12.7, 0), align=None)
    revolve(axis=Axis((0, 0, 69.85), (0, 0, -1)), mode=Mode.SUBTRACT)

    # Fillet1
    fillet1_edges = [part.edges().sort_by_distance(p)[0] for p in [
        (79.375, 0, 50.8),
        (-79.375, 0, 50.8),
        (0, -50.8, 63.5),
        (0, 50.8, 50.8),
        (0, 50.8, 63.5),
        (0, -50.8, 50.8),
        (25.4, 0, 50.8),
        (25.4, 0, 6.35),
        (12.7, 0, -54.102),
        (0, 12.7, 63.5),
    ]]
    fillet(fillet1_edges, radius=FILLET1_R)

    # Fillet2
    fillet2_edges = [part.edges().sort_by_distance(p)[0] for p in [
        (12.7, 0, 6.35),
    ]]
    fillet(fillet2_edges, radius=FILLET2_R)


with BuildPart() as part_1:
    # Body-Move/Copy1: moved
    add(part.part.rotate(Axis((0, 0, 0), (0, 0, 1)), BODY_MOVE_COPY1_ANGLE))


solid = part_1.part
